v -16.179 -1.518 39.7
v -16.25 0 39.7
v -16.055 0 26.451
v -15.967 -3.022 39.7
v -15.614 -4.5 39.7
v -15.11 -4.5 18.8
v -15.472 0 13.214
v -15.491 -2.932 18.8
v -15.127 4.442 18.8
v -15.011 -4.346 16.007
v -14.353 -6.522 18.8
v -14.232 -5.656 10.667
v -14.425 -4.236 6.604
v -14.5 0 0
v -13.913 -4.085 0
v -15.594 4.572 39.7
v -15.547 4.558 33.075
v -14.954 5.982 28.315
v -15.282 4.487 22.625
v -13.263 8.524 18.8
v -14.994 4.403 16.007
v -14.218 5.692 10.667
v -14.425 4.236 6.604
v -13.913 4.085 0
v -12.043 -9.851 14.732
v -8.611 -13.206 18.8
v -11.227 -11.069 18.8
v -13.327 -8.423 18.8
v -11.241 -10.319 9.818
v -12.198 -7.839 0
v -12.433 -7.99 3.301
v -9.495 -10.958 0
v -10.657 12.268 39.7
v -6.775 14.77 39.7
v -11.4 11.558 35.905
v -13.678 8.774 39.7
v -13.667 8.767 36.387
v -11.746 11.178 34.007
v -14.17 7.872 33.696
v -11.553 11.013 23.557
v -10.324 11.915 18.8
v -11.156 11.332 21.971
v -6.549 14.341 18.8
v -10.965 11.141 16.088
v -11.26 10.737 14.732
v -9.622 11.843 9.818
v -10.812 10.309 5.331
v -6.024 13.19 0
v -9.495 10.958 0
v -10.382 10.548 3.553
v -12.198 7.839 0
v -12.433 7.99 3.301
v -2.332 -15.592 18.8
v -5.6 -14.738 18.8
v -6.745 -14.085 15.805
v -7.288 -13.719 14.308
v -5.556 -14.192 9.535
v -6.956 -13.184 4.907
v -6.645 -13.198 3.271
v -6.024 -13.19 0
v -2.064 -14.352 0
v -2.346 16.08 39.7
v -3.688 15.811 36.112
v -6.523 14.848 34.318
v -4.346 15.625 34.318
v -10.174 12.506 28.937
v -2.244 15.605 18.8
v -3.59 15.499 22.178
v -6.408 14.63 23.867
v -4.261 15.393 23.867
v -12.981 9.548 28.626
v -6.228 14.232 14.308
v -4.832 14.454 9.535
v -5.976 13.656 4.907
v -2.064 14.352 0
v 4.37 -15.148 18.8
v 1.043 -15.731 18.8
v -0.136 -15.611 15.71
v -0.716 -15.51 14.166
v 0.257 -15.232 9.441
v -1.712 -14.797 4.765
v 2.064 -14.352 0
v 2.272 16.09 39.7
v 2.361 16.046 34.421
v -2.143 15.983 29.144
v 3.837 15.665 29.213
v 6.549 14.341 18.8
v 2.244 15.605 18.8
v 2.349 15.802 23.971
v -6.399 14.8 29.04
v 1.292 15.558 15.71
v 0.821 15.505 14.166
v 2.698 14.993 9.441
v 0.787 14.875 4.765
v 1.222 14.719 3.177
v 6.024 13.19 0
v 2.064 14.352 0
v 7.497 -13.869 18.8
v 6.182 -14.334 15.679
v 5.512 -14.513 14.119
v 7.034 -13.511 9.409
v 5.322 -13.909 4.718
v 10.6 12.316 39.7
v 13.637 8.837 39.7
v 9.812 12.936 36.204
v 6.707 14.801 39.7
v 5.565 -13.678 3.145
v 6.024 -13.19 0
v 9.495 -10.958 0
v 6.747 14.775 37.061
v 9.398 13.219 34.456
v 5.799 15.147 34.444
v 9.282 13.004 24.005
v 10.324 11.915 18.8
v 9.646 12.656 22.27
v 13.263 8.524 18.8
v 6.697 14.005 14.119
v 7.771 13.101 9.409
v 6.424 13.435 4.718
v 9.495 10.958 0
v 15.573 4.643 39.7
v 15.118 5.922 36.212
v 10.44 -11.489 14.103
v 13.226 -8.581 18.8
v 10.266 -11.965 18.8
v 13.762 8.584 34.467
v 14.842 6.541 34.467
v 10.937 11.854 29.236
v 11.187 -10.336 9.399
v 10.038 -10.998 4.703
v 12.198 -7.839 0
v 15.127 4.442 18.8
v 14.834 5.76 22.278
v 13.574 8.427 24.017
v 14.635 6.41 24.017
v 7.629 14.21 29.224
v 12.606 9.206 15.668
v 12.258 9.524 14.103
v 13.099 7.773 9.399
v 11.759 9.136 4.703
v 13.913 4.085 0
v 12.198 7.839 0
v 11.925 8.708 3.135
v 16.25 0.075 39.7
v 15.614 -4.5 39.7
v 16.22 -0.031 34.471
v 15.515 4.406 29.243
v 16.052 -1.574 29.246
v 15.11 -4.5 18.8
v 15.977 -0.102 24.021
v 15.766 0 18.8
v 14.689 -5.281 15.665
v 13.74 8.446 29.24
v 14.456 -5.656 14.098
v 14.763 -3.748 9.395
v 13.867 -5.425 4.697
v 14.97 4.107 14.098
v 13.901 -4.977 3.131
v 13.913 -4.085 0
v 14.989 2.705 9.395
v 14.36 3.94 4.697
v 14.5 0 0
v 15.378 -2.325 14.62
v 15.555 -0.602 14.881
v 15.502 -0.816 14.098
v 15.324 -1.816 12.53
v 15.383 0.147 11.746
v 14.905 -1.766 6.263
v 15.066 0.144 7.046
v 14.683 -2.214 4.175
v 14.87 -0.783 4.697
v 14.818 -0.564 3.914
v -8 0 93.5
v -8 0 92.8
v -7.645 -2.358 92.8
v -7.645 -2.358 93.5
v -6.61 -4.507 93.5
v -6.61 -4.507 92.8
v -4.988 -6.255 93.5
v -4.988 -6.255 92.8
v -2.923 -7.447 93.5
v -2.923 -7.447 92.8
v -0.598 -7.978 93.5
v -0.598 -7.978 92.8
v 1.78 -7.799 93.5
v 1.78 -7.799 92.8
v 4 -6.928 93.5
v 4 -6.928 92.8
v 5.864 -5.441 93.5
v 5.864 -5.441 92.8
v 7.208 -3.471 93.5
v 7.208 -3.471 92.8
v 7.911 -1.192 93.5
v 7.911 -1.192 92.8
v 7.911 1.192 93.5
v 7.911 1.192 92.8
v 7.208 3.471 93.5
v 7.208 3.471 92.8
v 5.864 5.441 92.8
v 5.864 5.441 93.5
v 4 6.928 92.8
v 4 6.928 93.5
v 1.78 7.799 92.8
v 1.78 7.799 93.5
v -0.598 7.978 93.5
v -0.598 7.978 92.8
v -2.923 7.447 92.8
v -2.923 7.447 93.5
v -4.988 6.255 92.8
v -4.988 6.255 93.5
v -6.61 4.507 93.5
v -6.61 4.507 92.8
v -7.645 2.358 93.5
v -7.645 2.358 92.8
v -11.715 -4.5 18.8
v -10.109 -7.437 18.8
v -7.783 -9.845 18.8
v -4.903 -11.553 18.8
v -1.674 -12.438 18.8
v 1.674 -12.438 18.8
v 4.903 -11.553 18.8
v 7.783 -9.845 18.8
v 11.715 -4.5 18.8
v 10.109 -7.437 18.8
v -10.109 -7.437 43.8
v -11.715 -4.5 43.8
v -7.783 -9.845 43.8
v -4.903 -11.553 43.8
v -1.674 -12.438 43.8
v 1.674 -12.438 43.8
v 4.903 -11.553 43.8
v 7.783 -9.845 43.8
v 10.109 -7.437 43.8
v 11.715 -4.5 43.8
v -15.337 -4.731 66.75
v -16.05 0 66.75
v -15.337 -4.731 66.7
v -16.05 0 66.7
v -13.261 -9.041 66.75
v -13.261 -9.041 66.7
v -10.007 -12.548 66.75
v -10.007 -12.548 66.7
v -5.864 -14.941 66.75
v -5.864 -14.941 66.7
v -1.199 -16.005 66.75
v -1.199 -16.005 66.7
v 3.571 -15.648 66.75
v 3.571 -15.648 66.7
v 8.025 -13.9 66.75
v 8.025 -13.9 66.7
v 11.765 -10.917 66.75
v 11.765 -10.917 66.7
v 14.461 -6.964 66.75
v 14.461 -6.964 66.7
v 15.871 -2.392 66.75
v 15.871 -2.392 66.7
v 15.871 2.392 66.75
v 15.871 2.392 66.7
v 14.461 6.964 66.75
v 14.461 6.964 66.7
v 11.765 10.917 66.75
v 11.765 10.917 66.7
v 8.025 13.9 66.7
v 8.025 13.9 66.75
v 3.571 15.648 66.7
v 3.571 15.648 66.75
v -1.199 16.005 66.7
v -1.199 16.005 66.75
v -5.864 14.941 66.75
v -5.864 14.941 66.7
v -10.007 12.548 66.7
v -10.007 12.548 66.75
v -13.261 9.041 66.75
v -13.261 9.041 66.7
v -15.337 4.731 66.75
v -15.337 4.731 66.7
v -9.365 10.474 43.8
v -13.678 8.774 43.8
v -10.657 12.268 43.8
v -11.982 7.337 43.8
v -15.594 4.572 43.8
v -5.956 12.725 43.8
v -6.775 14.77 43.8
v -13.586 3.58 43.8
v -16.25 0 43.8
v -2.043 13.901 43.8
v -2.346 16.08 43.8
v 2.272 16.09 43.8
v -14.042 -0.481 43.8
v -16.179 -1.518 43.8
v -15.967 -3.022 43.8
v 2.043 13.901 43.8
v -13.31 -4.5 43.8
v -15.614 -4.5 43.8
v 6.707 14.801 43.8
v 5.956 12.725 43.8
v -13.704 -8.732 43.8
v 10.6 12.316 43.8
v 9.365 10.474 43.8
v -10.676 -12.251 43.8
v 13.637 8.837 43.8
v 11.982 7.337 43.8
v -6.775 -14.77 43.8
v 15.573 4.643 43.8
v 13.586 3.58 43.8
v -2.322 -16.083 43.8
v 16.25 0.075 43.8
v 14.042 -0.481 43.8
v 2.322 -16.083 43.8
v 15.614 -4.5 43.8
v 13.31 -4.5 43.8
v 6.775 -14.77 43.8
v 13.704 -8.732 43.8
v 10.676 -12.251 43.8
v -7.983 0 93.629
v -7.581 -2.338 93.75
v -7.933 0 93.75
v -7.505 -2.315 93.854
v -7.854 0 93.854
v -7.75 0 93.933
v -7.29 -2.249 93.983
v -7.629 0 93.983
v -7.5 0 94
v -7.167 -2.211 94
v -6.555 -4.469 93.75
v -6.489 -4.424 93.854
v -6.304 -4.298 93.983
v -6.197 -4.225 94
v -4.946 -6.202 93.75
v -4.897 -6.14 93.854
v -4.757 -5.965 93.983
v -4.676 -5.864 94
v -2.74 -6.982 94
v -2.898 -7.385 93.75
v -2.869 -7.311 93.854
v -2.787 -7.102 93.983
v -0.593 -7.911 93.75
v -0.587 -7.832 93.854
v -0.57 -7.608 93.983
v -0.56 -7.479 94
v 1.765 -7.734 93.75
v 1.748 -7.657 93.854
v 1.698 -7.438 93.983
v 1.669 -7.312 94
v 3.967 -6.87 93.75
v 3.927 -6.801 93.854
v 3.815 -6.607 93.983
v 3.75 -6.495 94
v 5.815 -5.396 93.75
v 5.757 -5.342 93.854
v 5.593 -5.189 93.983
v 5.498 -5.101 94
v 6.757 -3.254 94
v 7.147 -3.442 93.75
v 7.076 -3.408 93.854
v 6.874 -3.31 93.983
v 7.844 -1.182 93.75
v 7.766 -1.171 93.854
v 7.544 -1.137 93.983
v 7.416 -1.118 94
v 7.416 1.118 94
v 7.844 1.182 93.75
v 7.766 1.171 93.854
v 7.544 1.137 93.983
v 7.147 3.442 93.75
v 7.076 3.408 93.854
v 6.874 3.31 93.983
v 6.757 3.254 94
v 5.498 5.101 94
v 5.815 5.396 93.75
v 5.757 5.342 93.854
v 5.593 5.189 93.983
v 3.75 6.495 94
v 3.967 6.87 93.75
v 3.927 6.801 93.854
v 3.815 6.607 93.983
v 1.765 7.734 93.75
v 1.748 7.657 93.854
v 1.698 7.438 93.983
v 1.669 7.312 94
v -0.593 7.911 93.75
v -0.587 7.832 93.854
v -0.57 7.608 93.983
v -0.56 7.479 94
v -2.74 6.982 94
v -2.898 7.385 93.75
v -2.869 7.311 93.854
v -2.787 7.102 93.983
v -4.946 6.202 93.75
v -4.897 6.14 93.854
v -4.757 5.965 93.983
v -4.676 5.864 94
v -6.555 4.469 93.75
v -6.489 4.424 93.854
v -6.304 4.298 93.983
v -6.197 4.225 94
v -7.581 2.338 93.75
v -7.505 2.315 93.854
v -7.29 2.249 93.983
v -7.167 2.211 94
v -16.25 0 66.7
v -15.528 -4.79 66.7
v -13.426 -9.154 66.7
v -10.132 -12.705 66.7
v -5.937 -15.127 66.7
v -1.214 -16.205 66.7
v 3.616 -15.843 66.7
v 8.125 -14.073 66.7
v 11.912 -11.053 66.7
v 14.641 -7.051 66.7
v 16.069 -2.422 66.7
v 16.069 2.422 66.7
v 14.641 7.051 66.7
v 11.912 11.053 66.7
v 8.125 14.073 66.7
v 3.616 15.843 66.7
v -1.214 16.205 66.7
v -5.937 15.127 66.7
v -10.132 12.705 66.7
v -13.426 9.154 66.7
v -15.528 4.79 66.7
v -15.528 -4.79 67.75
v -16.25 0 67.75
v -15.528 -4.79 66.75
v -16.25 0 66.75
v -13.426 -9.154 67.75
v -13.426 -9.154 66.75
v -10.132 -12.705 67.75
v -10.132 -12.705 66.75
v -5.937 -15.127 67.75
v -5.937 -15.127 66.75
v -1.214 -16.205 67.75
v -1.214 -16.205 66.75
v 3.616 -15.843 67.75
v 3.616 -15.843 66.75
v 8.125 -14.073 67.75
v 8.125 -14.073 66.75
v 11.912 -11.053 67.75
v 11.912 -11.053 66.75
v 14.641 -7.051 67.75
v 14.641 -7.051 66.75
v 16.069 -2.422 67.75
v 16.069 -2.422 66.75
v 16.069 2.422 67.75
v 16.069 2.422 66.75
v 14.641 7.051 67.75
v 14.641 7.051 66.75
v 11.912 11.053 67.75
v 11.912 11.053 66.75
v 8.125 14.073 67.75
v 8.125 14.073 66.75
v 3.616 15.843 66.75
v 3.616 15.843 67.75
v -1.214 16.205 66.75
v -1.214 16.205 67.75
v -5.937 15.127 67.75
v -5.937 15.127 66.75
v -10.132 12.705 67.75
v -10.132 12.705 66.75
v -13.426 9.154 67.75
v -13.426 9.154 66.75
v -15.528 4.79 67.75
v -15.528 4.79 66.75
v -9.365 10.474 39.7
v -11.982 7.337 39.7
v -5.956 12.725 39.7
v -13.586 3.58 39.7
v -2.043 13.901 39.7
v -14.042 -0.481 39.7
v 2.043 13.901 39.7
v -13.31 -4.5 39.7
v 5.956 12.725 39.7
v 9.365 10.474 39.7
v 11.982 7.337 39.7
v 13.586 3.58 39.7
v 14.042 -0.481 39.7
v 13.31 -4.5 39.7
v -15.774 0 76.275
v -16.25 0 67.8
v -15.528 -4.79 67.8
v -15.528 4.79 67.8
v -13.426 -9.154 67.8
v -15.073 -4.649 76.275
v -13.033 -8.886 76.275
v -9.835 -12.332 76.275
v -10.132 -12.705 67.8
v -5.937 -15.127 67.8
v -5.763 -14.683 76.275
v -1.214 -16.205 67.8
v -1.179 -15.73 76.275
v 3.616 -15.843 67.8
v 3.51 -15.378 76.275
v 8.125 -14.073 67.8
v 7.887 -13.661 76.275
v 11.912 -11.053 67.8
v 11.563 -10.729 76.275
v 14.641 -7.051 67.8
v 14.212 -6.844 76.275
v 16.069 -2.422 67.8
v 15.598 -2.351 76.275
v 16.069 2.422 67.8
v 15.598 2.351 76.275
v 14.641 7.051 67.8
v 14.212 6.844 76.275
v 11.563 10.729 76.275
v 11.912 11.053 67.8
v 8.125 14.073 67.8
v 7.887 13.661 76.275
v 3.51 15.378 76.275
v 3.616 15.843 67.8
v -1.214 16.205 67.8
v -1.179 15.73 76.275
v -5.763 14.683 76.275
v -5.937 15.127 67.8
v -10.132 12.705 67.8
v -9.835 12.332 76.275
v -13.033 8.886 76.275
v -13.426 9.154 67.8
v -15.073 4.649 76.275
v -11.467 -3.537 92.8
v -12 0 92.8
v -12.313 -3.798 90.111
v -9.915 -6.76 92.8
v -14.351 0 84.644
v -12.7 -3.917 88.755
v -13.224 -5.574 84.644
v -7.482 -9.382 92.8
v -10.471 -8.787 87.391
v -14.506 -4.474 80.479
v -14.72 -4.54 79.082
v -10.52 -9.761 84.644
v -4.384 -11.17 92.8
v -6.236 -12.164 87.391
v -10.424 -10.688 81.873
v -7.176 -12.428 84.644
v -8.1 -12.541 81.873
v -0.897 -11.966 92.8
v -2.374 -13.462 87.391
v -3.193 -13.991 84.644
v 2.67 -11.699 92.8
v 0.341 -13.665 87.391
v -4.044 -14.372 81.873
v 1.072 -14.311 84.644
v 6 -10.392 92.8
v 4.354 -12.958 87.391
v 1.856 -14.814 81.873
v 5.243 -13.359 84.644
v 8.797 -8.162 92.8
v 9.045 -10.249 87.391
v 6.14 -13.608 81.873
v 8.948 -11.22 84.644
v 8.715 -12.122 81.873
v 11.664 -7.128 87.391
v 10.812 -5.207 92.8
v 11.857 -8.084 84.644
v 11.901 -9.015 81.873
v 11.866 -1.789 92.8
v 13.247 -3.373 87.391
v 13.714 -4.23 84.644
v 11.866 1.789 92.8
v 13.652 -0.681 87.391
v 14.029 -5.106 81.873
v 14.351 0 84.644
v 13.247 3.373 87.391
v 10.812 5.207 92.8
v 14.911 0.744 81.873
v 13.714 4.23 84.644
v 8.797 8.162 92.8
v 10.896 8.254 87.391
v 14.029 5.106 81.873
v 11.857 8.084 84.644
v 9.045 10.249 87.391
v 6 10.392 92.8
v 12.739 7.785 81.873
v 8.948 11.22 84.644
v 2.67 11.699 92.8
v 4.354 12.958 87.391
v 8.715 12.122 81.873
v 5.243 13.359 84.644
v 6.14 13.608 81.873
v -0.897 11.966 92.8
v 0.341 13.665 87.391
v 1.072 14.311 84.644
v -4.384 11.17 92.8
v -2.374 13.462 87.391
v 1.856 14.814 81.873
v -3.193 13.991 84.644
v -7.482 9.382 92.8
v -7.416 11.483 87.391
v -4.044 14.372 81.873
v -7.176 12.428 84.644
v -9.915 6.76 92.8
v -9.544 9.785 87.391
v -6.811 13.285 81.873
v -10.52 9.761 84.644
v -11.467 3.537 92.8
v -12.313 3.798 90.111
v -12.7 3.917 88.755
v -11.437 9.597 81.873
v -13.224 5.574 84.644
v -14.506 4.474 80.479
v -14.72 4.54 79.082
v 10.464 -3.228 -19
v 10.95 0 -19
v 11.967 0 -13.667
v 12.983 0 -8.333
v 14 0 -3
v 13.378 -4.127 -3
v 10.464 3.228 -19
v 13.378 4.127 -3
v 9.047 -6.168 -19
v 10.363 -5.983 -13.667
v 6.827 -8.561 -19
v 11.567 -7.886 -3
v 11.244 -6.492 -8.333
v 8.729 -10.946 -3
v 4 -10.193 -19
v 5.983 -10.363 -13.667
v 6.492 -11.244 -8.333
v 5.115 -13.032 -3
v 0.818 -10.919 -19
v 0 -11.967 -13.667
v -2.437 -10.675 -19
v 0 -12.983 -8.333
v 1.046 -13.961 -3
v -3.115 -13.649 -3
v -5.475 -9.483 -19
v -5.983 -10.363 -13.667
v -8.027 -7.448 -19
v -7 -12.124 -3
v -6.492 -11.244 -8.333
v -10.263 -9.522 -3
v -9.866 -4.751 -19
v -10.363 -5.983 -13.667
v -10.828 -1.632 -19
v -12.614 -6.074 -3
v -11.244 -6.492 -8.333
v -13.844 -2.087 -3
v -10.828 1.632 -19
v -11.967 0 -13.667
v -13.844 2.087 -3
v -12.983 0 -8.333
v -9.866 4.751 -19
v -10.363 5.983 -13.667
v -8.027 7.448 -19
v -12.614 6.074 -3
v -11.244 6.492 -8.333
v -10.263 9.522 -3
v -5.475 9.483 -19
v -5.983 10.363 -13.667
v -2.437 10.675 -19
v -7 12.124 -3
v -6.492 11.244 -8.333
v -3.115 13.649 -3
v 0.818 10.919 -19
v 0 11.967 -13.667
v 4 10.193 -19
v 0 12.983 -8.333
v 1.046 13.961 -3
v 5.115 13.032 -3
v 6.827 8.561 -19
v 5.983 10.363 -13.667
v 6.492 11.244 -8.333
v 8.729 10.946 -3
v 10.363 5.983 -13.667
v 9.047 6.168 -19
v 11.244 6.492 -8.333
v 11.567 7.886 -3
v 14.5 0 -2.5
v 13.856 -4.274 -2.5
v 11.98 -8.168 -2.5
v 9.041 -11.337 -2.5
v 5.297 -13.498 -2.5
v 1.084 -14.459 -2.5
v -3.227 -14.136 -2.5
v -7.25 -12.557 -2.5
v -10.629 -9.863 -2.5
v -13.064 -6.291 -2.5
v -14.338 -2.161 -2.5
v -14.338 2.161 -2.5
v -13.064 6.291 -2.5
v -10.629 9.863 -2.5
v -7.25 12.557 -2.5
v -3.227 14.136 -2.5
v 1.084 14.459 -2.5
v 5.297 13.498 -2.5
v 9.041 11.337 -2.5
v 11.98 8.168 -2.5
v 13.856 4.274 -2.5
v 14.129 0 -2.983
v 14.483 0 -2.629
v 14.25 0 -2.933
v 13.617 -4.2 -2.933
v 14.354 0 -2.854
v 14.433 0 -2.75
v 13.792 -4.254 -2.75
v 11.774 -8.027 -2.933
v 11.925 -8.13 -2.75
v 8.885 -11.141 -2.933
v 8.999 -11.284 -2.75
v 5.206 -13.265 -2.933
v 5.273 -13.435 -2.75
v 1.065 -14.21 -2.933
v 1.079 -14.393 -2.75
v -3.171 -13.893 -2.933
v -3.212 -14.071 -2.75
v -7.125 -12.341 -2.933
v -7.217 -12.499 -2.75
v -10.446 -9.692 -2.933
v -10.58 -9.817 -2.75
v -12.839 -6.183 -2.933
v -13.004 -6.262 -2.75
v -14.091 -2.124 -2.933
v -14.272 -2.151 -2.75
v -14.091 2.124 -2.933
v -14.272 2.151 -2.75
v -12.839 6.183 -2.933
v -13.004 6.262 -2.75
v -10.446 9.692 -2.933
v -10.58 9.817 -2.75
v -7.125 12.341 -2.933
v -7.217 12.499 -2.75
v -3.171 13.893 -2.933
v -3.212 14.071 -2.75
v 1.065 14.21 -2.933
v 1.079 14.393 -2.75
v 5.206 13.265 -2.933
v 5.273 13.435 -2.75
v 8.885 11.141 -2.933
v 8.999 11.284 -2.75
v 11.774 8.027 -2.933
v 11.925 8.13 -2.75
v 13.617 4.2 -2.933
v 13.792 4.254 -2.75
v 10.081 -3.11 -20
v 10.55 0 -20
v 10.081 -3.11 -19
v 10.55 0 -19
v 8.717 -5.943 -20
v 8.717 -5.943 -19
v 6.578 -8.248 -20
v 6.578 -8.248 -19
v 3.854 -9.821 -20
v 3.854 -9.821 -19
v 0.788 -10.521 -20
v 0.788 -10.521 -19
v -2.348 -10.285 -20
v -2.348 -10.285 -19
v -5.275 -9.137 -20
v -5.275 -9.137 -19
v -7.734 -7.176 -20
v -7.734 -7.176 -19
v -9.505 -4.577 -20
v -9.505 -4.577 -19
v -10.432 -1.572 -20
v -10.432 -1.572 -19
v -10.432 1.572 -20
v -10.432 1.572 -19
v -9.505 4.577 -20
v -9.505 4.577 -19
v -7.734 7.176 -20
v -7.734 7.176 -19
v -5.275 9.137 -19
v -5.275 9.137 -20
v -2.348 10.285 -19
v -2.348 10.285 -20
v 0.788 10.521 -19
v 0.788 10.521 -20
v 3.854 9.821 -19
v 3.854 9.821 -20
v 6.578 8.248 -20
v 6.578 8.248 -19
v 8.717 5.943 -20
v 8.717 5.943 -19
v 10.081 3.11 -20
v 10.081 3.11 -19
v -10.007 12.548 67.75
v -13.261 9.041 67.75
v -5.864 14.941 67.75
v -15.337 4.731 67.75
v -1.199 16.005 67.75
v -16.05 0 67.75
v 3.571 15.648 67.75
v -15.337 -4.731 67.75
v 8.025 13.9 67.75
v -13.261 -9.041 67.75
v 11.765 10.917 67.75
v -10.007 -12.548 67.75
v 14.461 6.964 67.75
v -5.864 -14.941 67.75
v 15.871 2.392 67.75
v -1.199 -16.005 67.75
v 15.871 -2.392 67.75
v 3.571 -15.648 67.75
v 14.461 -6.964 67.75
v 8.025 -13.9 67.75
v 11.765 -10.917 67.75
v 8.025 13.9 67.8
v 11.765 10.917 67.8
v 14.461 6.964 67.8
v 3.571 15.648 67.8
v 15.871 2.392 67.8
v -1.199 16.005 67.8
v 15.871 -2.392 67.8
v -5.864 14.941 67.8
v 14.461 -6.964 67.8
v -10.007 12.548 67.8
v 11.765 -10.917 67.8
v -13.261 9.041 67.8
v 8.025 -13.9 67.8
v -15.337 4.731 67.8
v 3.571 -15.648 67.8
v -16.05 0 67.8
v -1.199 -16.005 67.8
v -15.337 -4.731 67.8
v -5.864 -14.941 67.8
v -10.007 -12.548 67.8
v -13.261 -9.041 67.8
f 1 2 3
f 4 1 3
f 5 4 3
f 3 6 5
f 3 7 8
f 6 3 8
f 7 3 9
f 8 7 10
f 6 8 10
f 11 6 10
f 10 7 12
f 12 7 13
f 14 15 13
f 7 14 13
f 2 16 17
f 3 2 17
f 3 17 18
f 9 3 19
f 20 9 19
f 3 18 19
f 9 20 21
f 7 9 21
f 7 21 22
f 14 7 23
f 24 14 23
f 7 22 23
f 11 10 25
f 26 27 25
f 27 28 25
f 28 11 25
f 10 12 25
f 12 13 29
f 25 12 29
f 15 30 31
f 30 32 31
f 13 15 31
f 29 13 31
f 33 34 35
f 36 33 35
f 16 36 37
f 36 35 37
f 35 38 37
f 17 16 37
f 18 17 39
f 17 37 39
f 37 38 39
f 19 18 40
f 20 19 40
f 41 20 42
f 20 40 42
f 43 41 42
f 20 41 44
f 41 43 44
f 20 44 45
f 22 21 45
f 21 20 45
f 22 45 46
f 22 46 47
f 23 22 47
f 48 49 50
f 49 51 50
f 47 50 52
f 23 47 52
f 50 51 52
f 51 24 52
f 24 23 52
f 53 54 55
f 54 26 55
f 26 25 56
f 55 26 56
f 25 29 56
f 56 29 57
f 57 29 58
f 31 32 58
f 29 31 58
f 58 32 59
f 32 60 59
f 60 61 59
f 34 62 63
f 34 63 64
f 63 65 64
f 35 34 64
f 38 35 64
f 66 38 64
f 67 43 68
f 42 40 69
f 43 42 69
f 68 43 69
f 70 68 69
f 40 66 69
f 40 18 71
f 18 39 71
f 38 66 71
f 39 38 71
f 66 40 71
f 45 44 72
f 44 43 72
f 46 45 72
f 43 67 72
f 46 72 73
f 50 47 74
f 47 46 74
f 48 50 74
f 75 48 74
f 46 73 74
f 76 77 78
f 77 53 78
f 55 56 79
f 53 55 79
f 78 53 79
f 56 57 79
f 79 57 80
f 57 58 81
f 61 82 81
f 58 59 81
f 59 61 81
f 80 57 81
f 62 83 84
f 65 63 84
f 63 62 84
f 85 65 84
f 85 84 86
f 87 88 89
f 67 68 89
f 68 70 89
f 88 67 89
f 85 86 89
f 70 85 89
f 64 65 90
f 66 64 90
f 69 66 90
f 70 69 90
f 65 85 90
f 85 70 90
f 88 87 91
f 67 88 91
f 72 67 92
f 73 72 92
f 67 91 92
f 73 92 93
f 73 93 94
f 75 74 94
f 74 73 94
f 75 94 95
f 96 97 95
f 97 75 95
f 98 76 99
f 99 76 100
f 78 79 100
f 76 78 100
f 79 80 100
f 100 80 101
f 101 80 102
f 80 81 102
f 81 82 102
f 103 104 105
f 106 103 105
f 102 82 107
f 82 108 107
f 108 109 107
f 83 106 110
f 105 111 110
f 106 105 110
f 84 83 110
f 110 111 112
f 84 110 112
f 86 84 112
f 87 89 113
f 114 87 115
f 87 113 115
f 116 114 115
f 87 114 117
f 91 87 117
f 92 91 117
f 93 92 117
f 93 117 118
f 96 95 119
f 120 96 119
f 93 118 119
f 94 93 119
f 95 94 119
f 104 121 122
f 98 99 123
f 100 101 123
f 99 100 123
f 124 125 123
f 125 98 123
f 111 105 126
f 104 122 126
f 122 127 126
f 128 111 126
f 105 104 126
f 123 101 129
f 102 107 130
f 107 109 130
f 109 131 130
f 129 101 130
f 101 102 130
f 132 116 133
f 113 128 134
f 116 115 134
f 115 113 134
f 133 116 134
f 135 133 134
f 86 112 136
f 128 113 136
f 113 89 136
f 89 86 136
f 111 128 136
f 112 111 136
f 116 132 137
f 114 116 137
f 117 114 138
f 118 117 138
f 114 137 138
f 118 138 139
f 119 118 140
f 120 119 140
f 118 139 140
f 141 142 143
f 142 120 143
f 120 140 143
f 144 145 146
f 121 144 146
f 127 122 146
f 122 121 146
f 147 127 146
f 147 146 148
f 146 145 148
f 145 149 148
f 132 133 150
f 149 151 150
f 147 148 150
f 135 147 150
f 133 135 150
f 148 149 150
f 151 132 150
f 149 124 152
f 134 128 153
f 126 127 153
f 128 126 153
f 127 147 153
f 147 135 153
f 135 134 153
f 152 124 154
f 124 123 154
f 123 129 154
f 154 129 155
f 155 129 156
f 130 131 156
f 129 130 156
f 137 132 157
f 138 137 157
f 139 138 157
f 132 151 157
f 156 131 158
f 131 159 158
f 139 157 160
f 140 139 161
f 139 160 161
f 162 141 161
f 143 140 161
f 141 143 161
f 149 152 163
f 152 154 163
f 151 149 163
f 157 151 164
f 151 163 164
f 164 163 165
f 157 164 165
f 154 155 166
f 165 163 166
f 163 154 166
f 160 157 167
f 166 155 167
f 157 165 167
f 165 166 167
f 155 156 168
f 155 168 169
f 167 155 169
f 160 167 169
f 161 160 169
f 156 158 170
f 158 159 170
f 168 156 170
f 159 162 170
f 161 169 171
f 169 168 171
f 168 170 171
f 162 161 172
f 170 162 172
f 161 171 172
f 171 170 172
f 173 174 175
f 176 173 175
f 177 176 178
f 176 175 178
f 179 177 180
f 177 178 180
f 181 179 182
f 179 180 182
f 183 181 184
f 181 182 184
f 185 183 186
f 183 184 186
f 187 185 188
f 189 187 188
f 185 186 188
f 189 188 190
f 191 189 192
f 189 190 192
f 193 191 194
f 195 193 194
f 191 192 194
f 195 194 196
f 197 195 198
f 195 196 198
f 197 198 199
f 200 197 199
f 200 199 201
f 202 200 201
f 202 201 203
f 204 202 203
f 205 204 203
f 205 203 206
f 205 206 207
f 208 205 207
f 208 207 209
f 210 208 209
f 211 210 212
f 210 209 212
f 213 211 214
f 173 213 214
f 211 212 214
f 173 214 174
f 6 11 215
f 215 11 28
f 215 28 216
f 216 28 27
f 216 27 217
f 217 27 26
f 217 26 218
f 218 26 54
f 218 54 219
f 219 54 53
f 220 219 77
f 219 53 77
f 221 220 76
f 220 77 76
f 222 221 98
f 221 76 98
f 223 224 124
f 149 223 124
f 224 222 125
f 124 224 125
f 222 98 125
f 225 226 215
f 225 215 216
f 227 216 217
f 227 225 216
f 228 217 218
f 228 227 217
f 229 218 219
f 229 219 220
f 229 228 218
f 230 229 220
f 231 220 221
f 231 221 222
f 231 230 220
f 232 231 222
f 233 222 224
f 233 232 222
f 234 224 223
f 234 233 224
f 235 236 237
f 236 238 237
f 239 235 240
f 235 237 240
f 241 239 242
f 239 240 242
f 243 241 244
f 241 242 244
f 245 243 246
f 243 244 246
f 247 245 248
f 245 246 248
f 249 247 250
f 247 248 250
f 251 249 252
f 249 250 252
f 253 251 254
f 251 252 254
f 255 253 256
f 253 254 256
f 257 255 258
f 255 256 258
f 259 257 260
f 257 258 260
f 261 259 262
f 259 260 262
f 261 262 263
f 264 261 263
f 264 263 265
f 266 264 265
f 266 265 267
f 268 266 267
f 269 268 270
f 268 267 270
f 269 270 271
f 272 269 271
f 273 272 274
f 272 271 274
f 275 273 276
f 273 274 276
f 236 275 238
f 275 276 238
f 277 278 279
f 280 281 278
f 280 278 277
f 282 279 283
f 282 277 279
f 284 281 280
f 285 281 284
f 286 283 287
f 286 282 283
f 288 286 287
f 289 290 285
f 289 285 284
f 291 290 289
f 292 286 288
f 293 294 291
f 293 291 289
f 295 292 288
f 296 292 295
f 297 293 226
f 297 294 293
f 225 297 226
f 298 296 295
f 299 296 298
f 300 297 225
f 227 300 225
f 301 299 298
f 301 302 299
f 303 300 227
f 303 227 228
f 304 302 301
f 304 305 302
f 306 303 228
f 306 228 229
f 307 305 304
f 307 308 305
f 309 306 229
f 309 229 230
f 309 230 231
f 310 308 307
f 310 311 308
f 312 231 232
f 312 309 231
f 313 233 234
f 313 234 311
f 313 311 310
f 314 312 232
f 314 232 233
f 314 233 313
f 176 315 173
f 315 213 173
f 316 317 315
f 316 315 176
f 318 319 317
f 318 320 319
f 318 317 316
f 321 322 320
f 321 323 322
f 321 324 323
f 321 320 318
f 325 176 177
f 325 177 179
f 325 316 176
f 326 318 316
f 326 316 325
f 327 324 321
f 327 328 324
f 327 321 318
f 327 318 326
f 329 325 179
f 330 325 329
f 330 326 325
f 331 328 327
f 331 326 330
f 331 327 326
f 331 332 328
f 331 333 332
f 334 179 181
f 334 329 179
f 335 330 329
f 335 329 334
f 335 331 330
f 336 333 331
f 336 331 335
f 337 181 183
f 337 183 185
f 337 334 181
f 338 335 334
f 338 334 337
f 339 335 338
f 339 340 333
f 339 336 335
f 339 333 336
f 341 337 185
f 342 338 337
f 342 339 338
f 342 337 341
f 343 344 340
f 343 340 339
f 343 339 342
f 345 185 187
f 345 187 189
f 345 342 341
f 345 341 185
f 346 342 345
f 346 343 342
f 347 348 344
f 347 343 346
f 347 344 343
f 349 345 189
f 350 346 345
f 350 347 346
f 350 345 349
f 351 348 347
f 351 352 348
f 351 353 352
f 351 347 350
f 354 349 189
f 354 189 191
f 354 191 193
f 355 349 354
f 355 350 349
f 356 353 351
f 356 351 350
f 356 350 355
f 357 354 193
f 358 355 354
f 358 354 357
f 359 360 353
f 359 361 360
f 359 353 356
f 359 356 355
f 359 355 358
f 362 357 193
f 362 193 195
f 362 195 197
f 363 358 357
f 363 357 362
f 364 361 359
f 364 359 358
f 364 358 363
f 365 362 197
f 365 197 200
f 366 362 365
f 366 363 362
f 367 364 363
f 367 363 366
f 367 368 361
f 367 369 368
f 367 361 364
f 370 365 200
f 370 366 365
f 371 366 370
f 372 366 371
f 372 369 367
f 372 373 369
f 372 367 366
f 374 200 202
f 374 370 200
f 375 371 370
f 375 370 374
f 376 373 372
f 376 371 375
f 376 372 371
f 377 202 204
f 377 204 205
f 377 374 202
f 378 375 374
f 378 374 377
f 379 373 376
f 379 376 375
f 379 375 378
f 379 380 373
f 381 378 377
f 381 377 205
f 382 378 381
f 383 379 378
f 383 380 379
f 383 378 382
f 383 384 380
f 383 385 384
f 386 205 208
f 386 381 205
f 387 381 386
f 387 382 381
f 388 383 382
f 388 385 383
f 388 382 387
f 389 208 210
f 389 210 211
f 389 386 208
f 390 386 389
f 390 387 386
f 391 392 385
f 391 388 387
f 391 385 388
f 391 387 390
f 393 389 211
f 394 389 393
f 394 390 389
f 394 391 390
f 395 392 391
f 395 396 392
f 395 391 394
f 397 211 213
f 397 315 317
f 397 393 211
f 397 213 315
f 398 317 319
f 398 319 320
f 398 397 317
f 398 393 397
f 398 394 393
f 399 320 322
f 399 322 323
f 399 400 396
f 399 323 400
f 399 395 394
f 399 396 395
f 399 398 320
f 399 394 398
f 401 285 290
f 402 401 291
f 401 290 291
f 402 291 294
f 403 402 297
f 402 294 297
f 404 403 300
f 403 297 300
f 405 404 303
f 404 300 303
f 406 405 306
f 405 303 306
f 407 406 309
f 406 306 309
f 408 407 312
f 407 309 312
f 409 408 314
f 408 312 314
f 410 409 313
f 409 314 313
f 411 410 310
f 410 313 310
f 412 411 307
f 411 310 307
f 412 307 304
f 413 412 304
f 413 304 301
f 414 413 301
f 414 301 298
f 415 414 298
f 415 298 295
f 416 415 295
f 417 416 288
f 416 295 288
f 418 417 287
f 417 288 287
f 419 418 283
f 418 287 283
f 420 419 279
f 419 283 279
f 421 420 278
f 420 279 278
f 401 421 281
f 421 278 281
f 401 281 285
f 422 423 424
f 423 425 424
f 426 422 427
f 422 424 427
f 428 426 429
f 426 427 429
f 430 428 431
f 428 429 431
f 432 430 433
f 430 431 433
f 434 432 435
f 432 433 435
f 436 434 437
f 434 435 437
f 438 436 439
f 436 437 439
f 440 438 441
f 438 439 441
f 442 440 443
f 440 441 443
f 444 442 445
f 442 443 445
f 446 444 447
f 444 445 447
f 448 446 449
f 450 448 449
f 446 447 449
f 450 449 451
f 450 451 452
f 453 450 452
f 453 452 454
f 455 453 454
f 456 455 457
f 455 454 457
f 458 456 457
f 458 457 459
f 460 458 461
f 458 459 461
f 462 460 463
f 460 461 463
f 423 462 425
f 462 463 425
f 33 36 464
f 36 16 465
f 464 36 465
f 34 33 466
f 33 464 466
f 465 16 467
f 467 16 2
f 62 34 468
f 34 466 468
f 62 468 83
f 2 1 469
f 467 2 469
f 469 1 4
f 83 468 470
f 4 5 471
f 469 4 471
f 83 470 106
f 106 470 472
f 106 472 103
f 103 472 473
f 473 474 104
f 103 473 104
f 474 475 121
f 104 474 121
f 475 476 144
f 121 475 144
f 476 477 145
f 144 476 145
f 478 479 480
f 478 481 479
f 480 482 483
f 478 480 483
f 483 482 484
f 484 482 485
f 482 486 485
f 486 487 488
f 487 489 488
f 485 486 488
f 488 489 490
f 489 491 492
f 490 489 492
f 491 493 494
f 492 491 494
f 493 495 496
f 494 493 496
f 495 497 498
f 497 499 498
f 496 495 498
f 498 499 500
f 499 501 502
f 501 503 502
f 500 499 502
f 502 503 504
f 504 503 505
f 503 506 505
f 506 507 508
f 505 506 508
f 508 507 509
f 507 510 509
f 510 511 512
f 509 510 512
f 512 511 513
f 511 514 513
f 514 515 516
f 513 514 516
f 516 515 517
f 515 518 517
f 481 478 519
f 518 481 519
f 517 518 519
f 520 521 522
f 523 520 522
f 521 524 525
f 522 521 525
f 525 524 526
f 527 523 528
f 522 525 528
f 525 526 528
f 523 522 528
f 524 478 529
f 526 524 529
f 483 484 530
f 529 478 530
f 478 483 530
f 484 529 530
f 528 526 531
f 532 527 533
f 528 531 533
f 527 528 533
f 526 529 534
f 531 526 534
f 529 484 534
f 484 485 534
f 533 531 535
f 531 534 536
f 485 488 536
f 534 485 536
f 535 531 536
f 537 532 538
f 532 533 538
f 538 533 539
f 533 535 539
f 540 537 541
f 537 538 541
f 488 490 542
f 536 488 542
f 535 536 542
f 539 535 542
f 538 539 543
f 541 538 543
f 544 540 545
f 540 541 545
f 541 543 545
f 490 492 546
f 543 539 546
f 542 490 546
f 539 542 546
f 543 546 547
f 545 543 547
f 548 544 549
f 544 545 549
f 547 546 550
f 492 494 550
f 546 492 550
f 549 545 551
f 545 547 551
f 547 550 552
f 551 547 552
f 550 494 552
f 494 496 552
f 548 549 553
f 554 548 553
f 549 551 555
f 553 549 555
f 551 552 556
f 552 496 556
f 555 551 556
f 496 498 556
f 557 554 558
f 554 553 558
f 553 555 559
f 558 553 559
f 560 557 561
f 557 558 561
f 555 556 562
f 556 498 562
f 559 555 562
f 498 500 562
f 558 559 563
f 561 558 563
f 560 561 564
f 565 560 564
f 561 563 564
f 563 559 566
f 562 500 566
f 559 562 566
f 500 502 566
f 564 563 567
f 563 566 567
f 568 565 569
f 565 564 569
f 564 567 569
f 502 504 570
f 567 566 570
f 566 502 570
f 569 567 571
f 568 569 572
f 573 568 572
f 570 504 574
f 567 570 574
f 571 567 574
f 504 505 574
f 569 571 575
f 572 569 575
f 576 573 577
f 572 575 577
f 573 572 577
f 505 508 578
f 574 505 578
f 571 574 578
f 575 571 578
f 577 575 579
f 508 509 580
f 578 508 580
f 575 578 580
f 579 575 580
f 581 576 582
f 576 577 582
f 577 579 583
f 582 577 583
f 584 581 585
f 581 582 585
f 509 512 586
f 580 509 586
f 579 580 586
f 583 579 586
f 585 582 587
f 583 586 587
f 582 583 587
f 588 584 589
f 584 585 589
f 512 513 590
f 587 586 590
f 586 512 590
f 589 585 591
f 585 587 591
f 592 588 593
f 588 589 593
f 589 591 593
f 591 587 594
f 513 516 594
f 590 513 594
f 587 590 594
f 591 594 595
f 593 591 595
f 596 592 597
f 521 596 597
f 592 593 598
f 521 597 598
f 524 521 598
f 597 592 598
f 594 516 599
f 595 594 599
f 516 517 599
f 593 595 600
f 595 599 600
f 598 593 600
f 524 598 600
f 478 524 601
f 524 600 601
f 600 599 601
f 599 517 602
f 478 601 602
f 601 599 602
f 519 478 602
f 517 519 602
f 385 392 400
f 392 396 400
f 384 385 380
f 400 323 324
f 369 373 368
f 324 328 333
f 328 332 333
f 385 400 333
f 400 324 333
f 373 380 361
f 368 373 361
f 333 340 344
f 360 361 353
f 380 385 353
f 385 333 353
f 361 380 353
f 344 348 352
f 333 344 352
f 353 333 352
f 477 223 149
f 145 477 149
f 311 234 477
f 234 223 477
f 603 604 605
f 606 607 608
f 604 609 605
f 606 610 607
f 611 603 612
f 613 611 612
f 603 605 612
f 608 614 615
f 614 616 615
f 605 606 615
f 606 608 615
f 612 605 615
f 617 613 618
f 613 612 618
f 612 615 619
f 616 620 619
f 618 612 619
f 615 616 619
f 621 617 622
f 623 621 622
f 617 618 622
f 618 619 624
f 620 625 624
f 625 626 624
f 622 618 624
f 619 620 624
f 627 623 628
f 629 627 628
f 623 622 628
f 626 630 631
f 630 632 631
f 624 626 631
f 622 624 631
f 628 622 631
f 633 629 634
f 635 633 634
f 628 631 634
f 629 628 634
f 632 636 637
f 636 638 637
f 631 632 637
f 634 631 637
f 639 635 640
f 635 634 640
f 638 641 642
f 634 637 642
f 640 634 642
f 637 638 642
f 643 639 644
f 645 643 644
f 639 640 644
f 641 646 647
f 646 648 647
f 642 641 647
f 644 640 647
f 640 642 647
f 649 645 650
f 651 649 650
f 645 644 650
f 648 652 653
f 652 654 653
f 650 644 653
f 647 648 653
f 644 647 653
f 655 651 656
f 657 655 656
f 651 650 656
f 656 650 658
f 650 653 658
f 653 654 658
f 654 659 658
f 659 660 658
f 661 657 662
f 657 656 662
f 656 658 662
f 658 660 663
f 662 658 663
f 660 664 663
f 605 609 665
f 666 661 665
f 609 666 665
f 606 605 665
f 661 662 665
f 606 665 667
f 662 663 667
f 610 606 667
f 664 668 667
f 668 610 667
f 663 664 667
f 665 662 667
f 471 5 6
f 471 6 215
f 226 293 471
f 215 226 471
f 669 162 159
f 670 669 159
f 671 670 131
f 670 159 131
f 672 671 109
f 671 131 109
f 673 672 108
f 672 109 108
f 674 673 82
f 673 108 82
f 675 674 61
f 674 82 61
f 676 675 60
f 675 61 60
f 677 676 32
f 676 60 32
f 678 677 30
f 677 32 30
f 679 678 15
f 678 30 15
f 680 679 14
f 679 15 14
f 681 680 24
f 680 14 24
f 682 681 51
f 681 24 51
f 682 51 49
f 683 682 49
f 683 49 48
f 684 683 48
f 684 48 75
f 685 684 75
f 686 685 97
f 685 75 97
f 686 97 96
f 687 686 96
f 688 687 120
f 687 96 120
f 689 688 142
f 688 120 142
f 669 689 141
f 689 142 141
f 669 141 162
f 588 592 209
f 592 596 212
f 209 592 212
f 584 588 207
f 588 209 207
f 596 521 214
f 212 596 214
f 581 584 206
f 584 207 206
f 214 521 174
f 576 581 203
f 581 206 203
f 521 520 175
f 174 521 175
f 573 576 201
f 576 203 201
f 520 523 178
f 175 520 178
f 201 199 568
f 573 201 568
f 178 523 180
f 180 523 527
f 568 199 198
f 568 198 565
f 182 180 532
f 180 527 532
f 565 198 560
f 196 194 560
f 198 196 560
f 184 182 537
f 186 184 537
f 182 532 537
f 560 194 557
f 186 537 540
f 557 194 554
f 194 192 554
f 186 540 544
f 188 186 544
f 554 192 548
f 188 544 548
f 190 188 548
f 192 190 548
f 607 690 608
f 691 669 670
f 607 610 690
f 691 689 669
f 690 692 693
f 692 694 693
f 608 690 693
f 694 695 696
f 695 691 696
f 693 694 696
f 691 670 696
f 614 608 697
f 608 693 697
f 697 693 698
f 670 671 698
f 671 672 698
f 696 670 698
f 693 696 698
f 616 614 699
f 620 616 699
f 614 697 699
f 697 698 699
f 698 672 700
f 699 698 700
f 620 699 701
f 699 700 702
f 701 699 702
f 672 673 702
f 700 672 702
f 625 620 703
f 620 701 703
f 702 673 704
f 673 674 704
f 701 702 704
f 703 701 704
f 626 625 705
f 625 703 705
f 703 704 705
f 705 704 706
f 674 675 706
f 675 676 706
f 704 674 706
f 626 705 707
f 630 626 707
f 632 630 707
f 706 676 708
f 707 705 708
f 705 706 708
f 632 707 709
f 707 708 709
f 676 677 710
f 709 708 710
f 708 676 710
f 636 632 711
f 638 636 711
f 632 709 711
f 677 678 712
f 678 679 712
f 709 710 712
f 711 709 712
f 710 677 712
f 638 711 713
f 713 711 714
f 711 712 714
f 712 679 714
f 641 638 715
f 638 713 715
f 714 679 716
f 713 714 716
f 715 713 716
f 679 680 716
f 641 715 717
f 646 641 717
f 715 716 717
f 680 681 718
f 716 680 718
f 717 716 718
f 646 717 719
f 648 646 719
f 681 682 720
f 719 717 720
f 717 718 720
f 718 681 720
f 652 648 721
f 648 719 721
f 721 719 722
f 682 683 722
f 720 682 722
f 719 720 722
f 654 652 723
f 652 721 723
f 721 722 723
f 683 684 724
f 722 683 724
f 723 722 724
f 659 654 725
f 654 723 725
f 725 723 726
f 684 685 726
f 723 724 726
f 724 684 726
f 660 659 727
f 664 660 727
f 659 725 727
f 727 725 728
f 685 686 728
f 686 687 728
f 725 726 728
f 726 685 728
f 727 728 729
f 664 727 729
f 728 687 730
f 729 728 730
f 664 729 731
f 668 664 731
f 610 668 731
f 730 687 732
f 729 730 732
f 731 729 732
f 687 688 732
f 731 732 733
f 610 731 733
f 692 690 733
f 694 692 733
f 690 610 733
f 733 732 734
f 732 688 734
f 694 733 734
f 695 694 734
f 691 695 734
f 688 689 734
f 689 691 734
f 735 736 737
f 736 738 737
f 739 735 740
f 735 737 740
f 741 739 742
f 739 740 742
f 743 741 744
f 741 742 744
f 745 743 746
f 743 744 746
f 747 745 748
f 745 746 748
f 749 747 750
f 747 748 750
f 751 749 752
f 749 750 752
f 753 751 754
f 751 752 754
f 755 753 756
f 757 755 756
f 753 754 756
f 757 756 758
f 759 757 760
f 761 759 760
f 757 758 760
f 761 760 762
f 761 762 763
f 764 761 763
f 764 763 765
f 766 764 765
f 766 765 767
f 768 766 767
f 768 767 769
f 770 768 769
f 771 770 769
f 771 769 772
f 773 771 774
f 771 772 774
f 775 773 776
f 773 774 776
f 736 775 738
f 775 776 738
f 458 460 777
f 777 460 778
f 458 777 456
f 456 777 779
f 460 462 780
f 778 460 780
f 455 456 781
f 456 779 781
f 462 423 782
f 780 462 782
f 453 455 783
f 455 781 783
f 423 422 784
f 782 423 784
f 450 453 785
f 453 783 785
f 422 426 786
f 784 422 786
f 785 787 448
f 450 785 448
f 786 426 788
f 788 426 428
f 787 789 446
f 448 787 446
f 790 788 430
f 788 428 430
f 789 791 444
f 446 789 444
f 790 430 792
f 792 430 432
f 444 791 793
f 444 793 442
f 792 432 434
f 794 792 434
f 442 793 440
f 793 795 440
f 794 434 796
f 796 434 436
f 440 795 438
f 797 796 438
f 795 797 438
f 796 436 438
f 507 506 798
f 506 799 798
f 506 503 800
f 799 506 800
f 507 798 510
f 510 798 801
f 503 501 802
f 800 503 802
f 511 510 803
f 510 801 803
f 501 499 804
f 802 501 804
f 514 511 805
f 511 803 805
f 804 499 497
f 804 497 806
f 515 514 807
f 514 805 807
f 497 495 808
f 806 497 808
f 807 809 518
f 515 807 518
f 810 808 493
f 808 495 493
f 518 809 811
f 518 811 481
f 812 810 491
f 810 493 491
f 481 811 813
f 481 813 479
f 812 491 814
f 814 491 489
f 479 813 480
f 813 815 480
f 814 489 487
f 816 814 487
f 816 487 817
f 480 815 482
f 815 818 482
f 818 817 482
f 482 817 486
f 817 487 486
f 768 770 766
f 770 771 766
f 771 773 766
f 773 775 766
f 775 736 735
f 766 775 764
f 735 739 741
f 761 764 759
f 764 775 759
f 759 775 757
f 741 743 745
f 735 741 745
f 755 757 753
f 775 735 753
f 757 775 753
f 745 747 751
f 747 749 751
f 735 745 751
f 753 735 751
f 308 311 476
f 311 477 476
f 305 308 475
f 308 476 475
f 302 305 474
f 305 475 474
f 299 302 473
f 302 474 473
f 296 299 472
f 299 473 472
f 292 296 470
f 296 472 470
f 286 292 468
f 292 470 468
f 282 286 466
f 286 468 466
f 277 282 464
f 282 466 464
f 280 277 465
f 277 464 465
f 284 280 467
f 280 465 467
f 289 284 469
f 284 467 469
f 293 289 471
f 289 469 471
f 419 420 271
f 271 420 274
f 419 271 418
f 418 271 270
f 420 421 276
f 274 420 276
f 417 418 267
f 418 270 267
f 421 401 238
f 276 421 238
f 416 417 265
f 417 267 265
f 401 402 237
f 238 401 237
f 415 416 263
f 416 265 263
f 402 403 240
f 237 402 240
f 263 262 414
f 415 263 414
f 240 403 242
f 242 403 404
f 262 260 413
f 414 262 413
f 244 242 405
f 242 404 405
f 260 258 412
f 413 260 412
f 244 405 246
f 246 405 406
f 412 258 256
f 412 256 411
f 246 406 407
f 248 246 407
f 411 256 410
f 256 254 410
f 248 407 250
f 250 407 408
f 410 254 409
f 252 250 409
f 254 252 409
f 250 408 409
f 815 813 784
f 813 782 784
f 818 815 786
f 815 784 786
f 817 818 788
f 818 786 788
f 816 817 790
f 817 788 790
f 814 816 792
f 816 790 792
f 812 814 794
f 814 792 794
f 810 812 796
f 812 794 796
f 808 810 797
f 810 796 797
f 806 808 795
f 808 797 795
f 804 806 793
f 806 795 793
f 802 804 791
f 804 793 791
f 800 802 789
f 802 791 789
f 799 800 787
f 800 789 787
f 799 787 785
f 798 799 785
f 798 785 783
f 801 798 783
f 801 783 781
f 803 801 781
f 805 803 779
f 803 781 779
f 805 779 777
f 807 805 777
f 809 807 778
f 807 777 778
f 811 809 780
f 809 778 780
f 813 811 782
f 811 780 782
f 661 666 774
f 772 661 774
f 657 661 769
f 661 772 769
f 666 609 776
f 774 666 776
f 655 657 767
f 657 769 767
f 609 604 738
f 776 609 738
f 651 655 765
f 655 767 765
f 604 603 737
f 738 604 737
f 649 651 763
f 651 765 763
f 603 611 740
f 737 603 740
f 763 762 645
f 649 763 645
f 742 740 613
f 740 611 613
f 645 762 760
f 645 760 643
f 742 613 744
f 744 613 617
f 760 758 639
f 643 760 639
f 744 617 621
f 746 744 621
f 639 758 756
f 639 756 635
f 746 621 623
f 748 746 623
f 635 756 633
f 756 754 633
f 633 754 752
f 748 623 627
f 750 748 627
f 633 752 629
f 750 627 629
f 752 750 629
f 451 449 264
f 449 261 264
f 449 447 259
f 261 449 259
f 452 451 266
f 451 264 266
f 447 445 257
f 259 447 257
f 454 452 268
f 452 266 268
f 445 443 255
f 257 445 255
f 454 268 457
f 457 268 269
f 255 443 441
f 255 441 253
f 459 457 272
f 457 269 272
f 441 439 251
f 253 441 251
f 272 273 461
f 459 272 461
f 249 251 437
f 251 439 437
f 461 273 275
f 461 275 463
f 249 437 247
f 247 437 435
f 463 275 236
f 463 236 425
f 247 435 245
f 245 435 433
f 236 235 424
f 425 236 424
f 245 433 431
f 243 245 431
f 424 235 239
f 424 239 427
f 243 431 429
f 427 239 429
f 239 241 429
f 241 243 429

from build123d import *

# Parameters (mm, degrees)
F3_DEPTH = 25
F4_R     = 0.5
F7_R     = 0.49999


# Not quite as in the source:
# - a fillet or chamfer is up to 0.001 mm smaller than in the source, because OpenCascade refuses the exact size


with BuildPart() as f1:
    # F0 (on Front) → F1 (revolve)
    with BuildSketch(Plane.XZ):
        with BuildLine():
            Line((-14.5, 0), (0, 0))
            Line((0, 0), (0, 94))
            Line((0, 94), (-8, 94))
            Line((-8, 94), (-8, 92.8))
            Line((-8, 92.8), (-12, 92.8))
            ThreePointArc((-12, 92.8), (-15.1799323999, 80.479338508), (-16.25, 67.8))
            Line((-16.25, 67.8), (-16.05, 67.8))
            Line((-16.05, 67.8), (-16.05, 67.75))
            Line((-16.05, 67.75), (-16.25, 67.75))
            Line((-16.25, 67.75), (-16.25, 66.75))
            Line((-16.25, 66.75), (-16.05, 66.75))
            Line((-16.05, 66.75), (-16.05, 66.7))
            Line((-16.05, 66.7), (-16.25, 66.7))
            Line((-16.25, 66.7), (-16.25, 43.8))
            Line((-16.25, 43.8), (-14.05, 43.8))
            Line((-14.05, 43.8), (-14.05, 39.7))
            Line((-14.05, 39.7), (-16.25, 39.7))
            ThreePointArc((-16.25, 39.7), (-15.8122876797, 19.8307240947), (-14.5, 0))
        make_face()
    revolve(axis=Axis((0, 0, 47), (0, 0, 1)))

    # F2 (on face) → F3 (cut)
    with BuildSketch(Plane(origin=(0, 0, 43.8), x_dir=(1, 0, 0), z_dir=(0, 0, -1))):
        with BuildLine():
            Line((11.7154812108, 4.5), (15.6144964696, 4.5))
            ThreePointArc((15.6144964696, 4.5), (0, 16.25), (-15.6144964696, 4.5))
            Line((-15.6144964696, 4.5), (-11.7154812108, 4.5))
            ThreePointArc((-11.7154812108, 4.5), (0, 12.55), (11.7154812108, 4.5))
        make_face()
    extrude(amount=F3_DEPTH, mode=Mode.SUBTRACT)

    # F4
    f4_edges = [f1.edges().sort_by_distance(p)[0] for p in [
        (8, 0, 94),
    ]]
    fillet(f4_edges, radius=F4_R)

    # F5 (on Front) → F6 (revolve)
    with BuildSketch(Plane.XZ):
        Polygon((14.5, 0), (0, 0), (0, -20), (10.55, -20), (10.55, -19), (10.95, -19), (14, -3), (14.5, -3), align=None)
    revolve(axis=Axis((0, 0, -10), (0, 0, -1)))

    # F7 (radius 0.5 in the source; OpenCascade refuses exactly that, so slightly less here)
    f7_edges = [f1.edges().sort_by_distance(p)[0] for p in [
        (-14.5, 0, -3),
    ]]
    fillet(f7_edges, radius=F7_R)


solid = f1.part
